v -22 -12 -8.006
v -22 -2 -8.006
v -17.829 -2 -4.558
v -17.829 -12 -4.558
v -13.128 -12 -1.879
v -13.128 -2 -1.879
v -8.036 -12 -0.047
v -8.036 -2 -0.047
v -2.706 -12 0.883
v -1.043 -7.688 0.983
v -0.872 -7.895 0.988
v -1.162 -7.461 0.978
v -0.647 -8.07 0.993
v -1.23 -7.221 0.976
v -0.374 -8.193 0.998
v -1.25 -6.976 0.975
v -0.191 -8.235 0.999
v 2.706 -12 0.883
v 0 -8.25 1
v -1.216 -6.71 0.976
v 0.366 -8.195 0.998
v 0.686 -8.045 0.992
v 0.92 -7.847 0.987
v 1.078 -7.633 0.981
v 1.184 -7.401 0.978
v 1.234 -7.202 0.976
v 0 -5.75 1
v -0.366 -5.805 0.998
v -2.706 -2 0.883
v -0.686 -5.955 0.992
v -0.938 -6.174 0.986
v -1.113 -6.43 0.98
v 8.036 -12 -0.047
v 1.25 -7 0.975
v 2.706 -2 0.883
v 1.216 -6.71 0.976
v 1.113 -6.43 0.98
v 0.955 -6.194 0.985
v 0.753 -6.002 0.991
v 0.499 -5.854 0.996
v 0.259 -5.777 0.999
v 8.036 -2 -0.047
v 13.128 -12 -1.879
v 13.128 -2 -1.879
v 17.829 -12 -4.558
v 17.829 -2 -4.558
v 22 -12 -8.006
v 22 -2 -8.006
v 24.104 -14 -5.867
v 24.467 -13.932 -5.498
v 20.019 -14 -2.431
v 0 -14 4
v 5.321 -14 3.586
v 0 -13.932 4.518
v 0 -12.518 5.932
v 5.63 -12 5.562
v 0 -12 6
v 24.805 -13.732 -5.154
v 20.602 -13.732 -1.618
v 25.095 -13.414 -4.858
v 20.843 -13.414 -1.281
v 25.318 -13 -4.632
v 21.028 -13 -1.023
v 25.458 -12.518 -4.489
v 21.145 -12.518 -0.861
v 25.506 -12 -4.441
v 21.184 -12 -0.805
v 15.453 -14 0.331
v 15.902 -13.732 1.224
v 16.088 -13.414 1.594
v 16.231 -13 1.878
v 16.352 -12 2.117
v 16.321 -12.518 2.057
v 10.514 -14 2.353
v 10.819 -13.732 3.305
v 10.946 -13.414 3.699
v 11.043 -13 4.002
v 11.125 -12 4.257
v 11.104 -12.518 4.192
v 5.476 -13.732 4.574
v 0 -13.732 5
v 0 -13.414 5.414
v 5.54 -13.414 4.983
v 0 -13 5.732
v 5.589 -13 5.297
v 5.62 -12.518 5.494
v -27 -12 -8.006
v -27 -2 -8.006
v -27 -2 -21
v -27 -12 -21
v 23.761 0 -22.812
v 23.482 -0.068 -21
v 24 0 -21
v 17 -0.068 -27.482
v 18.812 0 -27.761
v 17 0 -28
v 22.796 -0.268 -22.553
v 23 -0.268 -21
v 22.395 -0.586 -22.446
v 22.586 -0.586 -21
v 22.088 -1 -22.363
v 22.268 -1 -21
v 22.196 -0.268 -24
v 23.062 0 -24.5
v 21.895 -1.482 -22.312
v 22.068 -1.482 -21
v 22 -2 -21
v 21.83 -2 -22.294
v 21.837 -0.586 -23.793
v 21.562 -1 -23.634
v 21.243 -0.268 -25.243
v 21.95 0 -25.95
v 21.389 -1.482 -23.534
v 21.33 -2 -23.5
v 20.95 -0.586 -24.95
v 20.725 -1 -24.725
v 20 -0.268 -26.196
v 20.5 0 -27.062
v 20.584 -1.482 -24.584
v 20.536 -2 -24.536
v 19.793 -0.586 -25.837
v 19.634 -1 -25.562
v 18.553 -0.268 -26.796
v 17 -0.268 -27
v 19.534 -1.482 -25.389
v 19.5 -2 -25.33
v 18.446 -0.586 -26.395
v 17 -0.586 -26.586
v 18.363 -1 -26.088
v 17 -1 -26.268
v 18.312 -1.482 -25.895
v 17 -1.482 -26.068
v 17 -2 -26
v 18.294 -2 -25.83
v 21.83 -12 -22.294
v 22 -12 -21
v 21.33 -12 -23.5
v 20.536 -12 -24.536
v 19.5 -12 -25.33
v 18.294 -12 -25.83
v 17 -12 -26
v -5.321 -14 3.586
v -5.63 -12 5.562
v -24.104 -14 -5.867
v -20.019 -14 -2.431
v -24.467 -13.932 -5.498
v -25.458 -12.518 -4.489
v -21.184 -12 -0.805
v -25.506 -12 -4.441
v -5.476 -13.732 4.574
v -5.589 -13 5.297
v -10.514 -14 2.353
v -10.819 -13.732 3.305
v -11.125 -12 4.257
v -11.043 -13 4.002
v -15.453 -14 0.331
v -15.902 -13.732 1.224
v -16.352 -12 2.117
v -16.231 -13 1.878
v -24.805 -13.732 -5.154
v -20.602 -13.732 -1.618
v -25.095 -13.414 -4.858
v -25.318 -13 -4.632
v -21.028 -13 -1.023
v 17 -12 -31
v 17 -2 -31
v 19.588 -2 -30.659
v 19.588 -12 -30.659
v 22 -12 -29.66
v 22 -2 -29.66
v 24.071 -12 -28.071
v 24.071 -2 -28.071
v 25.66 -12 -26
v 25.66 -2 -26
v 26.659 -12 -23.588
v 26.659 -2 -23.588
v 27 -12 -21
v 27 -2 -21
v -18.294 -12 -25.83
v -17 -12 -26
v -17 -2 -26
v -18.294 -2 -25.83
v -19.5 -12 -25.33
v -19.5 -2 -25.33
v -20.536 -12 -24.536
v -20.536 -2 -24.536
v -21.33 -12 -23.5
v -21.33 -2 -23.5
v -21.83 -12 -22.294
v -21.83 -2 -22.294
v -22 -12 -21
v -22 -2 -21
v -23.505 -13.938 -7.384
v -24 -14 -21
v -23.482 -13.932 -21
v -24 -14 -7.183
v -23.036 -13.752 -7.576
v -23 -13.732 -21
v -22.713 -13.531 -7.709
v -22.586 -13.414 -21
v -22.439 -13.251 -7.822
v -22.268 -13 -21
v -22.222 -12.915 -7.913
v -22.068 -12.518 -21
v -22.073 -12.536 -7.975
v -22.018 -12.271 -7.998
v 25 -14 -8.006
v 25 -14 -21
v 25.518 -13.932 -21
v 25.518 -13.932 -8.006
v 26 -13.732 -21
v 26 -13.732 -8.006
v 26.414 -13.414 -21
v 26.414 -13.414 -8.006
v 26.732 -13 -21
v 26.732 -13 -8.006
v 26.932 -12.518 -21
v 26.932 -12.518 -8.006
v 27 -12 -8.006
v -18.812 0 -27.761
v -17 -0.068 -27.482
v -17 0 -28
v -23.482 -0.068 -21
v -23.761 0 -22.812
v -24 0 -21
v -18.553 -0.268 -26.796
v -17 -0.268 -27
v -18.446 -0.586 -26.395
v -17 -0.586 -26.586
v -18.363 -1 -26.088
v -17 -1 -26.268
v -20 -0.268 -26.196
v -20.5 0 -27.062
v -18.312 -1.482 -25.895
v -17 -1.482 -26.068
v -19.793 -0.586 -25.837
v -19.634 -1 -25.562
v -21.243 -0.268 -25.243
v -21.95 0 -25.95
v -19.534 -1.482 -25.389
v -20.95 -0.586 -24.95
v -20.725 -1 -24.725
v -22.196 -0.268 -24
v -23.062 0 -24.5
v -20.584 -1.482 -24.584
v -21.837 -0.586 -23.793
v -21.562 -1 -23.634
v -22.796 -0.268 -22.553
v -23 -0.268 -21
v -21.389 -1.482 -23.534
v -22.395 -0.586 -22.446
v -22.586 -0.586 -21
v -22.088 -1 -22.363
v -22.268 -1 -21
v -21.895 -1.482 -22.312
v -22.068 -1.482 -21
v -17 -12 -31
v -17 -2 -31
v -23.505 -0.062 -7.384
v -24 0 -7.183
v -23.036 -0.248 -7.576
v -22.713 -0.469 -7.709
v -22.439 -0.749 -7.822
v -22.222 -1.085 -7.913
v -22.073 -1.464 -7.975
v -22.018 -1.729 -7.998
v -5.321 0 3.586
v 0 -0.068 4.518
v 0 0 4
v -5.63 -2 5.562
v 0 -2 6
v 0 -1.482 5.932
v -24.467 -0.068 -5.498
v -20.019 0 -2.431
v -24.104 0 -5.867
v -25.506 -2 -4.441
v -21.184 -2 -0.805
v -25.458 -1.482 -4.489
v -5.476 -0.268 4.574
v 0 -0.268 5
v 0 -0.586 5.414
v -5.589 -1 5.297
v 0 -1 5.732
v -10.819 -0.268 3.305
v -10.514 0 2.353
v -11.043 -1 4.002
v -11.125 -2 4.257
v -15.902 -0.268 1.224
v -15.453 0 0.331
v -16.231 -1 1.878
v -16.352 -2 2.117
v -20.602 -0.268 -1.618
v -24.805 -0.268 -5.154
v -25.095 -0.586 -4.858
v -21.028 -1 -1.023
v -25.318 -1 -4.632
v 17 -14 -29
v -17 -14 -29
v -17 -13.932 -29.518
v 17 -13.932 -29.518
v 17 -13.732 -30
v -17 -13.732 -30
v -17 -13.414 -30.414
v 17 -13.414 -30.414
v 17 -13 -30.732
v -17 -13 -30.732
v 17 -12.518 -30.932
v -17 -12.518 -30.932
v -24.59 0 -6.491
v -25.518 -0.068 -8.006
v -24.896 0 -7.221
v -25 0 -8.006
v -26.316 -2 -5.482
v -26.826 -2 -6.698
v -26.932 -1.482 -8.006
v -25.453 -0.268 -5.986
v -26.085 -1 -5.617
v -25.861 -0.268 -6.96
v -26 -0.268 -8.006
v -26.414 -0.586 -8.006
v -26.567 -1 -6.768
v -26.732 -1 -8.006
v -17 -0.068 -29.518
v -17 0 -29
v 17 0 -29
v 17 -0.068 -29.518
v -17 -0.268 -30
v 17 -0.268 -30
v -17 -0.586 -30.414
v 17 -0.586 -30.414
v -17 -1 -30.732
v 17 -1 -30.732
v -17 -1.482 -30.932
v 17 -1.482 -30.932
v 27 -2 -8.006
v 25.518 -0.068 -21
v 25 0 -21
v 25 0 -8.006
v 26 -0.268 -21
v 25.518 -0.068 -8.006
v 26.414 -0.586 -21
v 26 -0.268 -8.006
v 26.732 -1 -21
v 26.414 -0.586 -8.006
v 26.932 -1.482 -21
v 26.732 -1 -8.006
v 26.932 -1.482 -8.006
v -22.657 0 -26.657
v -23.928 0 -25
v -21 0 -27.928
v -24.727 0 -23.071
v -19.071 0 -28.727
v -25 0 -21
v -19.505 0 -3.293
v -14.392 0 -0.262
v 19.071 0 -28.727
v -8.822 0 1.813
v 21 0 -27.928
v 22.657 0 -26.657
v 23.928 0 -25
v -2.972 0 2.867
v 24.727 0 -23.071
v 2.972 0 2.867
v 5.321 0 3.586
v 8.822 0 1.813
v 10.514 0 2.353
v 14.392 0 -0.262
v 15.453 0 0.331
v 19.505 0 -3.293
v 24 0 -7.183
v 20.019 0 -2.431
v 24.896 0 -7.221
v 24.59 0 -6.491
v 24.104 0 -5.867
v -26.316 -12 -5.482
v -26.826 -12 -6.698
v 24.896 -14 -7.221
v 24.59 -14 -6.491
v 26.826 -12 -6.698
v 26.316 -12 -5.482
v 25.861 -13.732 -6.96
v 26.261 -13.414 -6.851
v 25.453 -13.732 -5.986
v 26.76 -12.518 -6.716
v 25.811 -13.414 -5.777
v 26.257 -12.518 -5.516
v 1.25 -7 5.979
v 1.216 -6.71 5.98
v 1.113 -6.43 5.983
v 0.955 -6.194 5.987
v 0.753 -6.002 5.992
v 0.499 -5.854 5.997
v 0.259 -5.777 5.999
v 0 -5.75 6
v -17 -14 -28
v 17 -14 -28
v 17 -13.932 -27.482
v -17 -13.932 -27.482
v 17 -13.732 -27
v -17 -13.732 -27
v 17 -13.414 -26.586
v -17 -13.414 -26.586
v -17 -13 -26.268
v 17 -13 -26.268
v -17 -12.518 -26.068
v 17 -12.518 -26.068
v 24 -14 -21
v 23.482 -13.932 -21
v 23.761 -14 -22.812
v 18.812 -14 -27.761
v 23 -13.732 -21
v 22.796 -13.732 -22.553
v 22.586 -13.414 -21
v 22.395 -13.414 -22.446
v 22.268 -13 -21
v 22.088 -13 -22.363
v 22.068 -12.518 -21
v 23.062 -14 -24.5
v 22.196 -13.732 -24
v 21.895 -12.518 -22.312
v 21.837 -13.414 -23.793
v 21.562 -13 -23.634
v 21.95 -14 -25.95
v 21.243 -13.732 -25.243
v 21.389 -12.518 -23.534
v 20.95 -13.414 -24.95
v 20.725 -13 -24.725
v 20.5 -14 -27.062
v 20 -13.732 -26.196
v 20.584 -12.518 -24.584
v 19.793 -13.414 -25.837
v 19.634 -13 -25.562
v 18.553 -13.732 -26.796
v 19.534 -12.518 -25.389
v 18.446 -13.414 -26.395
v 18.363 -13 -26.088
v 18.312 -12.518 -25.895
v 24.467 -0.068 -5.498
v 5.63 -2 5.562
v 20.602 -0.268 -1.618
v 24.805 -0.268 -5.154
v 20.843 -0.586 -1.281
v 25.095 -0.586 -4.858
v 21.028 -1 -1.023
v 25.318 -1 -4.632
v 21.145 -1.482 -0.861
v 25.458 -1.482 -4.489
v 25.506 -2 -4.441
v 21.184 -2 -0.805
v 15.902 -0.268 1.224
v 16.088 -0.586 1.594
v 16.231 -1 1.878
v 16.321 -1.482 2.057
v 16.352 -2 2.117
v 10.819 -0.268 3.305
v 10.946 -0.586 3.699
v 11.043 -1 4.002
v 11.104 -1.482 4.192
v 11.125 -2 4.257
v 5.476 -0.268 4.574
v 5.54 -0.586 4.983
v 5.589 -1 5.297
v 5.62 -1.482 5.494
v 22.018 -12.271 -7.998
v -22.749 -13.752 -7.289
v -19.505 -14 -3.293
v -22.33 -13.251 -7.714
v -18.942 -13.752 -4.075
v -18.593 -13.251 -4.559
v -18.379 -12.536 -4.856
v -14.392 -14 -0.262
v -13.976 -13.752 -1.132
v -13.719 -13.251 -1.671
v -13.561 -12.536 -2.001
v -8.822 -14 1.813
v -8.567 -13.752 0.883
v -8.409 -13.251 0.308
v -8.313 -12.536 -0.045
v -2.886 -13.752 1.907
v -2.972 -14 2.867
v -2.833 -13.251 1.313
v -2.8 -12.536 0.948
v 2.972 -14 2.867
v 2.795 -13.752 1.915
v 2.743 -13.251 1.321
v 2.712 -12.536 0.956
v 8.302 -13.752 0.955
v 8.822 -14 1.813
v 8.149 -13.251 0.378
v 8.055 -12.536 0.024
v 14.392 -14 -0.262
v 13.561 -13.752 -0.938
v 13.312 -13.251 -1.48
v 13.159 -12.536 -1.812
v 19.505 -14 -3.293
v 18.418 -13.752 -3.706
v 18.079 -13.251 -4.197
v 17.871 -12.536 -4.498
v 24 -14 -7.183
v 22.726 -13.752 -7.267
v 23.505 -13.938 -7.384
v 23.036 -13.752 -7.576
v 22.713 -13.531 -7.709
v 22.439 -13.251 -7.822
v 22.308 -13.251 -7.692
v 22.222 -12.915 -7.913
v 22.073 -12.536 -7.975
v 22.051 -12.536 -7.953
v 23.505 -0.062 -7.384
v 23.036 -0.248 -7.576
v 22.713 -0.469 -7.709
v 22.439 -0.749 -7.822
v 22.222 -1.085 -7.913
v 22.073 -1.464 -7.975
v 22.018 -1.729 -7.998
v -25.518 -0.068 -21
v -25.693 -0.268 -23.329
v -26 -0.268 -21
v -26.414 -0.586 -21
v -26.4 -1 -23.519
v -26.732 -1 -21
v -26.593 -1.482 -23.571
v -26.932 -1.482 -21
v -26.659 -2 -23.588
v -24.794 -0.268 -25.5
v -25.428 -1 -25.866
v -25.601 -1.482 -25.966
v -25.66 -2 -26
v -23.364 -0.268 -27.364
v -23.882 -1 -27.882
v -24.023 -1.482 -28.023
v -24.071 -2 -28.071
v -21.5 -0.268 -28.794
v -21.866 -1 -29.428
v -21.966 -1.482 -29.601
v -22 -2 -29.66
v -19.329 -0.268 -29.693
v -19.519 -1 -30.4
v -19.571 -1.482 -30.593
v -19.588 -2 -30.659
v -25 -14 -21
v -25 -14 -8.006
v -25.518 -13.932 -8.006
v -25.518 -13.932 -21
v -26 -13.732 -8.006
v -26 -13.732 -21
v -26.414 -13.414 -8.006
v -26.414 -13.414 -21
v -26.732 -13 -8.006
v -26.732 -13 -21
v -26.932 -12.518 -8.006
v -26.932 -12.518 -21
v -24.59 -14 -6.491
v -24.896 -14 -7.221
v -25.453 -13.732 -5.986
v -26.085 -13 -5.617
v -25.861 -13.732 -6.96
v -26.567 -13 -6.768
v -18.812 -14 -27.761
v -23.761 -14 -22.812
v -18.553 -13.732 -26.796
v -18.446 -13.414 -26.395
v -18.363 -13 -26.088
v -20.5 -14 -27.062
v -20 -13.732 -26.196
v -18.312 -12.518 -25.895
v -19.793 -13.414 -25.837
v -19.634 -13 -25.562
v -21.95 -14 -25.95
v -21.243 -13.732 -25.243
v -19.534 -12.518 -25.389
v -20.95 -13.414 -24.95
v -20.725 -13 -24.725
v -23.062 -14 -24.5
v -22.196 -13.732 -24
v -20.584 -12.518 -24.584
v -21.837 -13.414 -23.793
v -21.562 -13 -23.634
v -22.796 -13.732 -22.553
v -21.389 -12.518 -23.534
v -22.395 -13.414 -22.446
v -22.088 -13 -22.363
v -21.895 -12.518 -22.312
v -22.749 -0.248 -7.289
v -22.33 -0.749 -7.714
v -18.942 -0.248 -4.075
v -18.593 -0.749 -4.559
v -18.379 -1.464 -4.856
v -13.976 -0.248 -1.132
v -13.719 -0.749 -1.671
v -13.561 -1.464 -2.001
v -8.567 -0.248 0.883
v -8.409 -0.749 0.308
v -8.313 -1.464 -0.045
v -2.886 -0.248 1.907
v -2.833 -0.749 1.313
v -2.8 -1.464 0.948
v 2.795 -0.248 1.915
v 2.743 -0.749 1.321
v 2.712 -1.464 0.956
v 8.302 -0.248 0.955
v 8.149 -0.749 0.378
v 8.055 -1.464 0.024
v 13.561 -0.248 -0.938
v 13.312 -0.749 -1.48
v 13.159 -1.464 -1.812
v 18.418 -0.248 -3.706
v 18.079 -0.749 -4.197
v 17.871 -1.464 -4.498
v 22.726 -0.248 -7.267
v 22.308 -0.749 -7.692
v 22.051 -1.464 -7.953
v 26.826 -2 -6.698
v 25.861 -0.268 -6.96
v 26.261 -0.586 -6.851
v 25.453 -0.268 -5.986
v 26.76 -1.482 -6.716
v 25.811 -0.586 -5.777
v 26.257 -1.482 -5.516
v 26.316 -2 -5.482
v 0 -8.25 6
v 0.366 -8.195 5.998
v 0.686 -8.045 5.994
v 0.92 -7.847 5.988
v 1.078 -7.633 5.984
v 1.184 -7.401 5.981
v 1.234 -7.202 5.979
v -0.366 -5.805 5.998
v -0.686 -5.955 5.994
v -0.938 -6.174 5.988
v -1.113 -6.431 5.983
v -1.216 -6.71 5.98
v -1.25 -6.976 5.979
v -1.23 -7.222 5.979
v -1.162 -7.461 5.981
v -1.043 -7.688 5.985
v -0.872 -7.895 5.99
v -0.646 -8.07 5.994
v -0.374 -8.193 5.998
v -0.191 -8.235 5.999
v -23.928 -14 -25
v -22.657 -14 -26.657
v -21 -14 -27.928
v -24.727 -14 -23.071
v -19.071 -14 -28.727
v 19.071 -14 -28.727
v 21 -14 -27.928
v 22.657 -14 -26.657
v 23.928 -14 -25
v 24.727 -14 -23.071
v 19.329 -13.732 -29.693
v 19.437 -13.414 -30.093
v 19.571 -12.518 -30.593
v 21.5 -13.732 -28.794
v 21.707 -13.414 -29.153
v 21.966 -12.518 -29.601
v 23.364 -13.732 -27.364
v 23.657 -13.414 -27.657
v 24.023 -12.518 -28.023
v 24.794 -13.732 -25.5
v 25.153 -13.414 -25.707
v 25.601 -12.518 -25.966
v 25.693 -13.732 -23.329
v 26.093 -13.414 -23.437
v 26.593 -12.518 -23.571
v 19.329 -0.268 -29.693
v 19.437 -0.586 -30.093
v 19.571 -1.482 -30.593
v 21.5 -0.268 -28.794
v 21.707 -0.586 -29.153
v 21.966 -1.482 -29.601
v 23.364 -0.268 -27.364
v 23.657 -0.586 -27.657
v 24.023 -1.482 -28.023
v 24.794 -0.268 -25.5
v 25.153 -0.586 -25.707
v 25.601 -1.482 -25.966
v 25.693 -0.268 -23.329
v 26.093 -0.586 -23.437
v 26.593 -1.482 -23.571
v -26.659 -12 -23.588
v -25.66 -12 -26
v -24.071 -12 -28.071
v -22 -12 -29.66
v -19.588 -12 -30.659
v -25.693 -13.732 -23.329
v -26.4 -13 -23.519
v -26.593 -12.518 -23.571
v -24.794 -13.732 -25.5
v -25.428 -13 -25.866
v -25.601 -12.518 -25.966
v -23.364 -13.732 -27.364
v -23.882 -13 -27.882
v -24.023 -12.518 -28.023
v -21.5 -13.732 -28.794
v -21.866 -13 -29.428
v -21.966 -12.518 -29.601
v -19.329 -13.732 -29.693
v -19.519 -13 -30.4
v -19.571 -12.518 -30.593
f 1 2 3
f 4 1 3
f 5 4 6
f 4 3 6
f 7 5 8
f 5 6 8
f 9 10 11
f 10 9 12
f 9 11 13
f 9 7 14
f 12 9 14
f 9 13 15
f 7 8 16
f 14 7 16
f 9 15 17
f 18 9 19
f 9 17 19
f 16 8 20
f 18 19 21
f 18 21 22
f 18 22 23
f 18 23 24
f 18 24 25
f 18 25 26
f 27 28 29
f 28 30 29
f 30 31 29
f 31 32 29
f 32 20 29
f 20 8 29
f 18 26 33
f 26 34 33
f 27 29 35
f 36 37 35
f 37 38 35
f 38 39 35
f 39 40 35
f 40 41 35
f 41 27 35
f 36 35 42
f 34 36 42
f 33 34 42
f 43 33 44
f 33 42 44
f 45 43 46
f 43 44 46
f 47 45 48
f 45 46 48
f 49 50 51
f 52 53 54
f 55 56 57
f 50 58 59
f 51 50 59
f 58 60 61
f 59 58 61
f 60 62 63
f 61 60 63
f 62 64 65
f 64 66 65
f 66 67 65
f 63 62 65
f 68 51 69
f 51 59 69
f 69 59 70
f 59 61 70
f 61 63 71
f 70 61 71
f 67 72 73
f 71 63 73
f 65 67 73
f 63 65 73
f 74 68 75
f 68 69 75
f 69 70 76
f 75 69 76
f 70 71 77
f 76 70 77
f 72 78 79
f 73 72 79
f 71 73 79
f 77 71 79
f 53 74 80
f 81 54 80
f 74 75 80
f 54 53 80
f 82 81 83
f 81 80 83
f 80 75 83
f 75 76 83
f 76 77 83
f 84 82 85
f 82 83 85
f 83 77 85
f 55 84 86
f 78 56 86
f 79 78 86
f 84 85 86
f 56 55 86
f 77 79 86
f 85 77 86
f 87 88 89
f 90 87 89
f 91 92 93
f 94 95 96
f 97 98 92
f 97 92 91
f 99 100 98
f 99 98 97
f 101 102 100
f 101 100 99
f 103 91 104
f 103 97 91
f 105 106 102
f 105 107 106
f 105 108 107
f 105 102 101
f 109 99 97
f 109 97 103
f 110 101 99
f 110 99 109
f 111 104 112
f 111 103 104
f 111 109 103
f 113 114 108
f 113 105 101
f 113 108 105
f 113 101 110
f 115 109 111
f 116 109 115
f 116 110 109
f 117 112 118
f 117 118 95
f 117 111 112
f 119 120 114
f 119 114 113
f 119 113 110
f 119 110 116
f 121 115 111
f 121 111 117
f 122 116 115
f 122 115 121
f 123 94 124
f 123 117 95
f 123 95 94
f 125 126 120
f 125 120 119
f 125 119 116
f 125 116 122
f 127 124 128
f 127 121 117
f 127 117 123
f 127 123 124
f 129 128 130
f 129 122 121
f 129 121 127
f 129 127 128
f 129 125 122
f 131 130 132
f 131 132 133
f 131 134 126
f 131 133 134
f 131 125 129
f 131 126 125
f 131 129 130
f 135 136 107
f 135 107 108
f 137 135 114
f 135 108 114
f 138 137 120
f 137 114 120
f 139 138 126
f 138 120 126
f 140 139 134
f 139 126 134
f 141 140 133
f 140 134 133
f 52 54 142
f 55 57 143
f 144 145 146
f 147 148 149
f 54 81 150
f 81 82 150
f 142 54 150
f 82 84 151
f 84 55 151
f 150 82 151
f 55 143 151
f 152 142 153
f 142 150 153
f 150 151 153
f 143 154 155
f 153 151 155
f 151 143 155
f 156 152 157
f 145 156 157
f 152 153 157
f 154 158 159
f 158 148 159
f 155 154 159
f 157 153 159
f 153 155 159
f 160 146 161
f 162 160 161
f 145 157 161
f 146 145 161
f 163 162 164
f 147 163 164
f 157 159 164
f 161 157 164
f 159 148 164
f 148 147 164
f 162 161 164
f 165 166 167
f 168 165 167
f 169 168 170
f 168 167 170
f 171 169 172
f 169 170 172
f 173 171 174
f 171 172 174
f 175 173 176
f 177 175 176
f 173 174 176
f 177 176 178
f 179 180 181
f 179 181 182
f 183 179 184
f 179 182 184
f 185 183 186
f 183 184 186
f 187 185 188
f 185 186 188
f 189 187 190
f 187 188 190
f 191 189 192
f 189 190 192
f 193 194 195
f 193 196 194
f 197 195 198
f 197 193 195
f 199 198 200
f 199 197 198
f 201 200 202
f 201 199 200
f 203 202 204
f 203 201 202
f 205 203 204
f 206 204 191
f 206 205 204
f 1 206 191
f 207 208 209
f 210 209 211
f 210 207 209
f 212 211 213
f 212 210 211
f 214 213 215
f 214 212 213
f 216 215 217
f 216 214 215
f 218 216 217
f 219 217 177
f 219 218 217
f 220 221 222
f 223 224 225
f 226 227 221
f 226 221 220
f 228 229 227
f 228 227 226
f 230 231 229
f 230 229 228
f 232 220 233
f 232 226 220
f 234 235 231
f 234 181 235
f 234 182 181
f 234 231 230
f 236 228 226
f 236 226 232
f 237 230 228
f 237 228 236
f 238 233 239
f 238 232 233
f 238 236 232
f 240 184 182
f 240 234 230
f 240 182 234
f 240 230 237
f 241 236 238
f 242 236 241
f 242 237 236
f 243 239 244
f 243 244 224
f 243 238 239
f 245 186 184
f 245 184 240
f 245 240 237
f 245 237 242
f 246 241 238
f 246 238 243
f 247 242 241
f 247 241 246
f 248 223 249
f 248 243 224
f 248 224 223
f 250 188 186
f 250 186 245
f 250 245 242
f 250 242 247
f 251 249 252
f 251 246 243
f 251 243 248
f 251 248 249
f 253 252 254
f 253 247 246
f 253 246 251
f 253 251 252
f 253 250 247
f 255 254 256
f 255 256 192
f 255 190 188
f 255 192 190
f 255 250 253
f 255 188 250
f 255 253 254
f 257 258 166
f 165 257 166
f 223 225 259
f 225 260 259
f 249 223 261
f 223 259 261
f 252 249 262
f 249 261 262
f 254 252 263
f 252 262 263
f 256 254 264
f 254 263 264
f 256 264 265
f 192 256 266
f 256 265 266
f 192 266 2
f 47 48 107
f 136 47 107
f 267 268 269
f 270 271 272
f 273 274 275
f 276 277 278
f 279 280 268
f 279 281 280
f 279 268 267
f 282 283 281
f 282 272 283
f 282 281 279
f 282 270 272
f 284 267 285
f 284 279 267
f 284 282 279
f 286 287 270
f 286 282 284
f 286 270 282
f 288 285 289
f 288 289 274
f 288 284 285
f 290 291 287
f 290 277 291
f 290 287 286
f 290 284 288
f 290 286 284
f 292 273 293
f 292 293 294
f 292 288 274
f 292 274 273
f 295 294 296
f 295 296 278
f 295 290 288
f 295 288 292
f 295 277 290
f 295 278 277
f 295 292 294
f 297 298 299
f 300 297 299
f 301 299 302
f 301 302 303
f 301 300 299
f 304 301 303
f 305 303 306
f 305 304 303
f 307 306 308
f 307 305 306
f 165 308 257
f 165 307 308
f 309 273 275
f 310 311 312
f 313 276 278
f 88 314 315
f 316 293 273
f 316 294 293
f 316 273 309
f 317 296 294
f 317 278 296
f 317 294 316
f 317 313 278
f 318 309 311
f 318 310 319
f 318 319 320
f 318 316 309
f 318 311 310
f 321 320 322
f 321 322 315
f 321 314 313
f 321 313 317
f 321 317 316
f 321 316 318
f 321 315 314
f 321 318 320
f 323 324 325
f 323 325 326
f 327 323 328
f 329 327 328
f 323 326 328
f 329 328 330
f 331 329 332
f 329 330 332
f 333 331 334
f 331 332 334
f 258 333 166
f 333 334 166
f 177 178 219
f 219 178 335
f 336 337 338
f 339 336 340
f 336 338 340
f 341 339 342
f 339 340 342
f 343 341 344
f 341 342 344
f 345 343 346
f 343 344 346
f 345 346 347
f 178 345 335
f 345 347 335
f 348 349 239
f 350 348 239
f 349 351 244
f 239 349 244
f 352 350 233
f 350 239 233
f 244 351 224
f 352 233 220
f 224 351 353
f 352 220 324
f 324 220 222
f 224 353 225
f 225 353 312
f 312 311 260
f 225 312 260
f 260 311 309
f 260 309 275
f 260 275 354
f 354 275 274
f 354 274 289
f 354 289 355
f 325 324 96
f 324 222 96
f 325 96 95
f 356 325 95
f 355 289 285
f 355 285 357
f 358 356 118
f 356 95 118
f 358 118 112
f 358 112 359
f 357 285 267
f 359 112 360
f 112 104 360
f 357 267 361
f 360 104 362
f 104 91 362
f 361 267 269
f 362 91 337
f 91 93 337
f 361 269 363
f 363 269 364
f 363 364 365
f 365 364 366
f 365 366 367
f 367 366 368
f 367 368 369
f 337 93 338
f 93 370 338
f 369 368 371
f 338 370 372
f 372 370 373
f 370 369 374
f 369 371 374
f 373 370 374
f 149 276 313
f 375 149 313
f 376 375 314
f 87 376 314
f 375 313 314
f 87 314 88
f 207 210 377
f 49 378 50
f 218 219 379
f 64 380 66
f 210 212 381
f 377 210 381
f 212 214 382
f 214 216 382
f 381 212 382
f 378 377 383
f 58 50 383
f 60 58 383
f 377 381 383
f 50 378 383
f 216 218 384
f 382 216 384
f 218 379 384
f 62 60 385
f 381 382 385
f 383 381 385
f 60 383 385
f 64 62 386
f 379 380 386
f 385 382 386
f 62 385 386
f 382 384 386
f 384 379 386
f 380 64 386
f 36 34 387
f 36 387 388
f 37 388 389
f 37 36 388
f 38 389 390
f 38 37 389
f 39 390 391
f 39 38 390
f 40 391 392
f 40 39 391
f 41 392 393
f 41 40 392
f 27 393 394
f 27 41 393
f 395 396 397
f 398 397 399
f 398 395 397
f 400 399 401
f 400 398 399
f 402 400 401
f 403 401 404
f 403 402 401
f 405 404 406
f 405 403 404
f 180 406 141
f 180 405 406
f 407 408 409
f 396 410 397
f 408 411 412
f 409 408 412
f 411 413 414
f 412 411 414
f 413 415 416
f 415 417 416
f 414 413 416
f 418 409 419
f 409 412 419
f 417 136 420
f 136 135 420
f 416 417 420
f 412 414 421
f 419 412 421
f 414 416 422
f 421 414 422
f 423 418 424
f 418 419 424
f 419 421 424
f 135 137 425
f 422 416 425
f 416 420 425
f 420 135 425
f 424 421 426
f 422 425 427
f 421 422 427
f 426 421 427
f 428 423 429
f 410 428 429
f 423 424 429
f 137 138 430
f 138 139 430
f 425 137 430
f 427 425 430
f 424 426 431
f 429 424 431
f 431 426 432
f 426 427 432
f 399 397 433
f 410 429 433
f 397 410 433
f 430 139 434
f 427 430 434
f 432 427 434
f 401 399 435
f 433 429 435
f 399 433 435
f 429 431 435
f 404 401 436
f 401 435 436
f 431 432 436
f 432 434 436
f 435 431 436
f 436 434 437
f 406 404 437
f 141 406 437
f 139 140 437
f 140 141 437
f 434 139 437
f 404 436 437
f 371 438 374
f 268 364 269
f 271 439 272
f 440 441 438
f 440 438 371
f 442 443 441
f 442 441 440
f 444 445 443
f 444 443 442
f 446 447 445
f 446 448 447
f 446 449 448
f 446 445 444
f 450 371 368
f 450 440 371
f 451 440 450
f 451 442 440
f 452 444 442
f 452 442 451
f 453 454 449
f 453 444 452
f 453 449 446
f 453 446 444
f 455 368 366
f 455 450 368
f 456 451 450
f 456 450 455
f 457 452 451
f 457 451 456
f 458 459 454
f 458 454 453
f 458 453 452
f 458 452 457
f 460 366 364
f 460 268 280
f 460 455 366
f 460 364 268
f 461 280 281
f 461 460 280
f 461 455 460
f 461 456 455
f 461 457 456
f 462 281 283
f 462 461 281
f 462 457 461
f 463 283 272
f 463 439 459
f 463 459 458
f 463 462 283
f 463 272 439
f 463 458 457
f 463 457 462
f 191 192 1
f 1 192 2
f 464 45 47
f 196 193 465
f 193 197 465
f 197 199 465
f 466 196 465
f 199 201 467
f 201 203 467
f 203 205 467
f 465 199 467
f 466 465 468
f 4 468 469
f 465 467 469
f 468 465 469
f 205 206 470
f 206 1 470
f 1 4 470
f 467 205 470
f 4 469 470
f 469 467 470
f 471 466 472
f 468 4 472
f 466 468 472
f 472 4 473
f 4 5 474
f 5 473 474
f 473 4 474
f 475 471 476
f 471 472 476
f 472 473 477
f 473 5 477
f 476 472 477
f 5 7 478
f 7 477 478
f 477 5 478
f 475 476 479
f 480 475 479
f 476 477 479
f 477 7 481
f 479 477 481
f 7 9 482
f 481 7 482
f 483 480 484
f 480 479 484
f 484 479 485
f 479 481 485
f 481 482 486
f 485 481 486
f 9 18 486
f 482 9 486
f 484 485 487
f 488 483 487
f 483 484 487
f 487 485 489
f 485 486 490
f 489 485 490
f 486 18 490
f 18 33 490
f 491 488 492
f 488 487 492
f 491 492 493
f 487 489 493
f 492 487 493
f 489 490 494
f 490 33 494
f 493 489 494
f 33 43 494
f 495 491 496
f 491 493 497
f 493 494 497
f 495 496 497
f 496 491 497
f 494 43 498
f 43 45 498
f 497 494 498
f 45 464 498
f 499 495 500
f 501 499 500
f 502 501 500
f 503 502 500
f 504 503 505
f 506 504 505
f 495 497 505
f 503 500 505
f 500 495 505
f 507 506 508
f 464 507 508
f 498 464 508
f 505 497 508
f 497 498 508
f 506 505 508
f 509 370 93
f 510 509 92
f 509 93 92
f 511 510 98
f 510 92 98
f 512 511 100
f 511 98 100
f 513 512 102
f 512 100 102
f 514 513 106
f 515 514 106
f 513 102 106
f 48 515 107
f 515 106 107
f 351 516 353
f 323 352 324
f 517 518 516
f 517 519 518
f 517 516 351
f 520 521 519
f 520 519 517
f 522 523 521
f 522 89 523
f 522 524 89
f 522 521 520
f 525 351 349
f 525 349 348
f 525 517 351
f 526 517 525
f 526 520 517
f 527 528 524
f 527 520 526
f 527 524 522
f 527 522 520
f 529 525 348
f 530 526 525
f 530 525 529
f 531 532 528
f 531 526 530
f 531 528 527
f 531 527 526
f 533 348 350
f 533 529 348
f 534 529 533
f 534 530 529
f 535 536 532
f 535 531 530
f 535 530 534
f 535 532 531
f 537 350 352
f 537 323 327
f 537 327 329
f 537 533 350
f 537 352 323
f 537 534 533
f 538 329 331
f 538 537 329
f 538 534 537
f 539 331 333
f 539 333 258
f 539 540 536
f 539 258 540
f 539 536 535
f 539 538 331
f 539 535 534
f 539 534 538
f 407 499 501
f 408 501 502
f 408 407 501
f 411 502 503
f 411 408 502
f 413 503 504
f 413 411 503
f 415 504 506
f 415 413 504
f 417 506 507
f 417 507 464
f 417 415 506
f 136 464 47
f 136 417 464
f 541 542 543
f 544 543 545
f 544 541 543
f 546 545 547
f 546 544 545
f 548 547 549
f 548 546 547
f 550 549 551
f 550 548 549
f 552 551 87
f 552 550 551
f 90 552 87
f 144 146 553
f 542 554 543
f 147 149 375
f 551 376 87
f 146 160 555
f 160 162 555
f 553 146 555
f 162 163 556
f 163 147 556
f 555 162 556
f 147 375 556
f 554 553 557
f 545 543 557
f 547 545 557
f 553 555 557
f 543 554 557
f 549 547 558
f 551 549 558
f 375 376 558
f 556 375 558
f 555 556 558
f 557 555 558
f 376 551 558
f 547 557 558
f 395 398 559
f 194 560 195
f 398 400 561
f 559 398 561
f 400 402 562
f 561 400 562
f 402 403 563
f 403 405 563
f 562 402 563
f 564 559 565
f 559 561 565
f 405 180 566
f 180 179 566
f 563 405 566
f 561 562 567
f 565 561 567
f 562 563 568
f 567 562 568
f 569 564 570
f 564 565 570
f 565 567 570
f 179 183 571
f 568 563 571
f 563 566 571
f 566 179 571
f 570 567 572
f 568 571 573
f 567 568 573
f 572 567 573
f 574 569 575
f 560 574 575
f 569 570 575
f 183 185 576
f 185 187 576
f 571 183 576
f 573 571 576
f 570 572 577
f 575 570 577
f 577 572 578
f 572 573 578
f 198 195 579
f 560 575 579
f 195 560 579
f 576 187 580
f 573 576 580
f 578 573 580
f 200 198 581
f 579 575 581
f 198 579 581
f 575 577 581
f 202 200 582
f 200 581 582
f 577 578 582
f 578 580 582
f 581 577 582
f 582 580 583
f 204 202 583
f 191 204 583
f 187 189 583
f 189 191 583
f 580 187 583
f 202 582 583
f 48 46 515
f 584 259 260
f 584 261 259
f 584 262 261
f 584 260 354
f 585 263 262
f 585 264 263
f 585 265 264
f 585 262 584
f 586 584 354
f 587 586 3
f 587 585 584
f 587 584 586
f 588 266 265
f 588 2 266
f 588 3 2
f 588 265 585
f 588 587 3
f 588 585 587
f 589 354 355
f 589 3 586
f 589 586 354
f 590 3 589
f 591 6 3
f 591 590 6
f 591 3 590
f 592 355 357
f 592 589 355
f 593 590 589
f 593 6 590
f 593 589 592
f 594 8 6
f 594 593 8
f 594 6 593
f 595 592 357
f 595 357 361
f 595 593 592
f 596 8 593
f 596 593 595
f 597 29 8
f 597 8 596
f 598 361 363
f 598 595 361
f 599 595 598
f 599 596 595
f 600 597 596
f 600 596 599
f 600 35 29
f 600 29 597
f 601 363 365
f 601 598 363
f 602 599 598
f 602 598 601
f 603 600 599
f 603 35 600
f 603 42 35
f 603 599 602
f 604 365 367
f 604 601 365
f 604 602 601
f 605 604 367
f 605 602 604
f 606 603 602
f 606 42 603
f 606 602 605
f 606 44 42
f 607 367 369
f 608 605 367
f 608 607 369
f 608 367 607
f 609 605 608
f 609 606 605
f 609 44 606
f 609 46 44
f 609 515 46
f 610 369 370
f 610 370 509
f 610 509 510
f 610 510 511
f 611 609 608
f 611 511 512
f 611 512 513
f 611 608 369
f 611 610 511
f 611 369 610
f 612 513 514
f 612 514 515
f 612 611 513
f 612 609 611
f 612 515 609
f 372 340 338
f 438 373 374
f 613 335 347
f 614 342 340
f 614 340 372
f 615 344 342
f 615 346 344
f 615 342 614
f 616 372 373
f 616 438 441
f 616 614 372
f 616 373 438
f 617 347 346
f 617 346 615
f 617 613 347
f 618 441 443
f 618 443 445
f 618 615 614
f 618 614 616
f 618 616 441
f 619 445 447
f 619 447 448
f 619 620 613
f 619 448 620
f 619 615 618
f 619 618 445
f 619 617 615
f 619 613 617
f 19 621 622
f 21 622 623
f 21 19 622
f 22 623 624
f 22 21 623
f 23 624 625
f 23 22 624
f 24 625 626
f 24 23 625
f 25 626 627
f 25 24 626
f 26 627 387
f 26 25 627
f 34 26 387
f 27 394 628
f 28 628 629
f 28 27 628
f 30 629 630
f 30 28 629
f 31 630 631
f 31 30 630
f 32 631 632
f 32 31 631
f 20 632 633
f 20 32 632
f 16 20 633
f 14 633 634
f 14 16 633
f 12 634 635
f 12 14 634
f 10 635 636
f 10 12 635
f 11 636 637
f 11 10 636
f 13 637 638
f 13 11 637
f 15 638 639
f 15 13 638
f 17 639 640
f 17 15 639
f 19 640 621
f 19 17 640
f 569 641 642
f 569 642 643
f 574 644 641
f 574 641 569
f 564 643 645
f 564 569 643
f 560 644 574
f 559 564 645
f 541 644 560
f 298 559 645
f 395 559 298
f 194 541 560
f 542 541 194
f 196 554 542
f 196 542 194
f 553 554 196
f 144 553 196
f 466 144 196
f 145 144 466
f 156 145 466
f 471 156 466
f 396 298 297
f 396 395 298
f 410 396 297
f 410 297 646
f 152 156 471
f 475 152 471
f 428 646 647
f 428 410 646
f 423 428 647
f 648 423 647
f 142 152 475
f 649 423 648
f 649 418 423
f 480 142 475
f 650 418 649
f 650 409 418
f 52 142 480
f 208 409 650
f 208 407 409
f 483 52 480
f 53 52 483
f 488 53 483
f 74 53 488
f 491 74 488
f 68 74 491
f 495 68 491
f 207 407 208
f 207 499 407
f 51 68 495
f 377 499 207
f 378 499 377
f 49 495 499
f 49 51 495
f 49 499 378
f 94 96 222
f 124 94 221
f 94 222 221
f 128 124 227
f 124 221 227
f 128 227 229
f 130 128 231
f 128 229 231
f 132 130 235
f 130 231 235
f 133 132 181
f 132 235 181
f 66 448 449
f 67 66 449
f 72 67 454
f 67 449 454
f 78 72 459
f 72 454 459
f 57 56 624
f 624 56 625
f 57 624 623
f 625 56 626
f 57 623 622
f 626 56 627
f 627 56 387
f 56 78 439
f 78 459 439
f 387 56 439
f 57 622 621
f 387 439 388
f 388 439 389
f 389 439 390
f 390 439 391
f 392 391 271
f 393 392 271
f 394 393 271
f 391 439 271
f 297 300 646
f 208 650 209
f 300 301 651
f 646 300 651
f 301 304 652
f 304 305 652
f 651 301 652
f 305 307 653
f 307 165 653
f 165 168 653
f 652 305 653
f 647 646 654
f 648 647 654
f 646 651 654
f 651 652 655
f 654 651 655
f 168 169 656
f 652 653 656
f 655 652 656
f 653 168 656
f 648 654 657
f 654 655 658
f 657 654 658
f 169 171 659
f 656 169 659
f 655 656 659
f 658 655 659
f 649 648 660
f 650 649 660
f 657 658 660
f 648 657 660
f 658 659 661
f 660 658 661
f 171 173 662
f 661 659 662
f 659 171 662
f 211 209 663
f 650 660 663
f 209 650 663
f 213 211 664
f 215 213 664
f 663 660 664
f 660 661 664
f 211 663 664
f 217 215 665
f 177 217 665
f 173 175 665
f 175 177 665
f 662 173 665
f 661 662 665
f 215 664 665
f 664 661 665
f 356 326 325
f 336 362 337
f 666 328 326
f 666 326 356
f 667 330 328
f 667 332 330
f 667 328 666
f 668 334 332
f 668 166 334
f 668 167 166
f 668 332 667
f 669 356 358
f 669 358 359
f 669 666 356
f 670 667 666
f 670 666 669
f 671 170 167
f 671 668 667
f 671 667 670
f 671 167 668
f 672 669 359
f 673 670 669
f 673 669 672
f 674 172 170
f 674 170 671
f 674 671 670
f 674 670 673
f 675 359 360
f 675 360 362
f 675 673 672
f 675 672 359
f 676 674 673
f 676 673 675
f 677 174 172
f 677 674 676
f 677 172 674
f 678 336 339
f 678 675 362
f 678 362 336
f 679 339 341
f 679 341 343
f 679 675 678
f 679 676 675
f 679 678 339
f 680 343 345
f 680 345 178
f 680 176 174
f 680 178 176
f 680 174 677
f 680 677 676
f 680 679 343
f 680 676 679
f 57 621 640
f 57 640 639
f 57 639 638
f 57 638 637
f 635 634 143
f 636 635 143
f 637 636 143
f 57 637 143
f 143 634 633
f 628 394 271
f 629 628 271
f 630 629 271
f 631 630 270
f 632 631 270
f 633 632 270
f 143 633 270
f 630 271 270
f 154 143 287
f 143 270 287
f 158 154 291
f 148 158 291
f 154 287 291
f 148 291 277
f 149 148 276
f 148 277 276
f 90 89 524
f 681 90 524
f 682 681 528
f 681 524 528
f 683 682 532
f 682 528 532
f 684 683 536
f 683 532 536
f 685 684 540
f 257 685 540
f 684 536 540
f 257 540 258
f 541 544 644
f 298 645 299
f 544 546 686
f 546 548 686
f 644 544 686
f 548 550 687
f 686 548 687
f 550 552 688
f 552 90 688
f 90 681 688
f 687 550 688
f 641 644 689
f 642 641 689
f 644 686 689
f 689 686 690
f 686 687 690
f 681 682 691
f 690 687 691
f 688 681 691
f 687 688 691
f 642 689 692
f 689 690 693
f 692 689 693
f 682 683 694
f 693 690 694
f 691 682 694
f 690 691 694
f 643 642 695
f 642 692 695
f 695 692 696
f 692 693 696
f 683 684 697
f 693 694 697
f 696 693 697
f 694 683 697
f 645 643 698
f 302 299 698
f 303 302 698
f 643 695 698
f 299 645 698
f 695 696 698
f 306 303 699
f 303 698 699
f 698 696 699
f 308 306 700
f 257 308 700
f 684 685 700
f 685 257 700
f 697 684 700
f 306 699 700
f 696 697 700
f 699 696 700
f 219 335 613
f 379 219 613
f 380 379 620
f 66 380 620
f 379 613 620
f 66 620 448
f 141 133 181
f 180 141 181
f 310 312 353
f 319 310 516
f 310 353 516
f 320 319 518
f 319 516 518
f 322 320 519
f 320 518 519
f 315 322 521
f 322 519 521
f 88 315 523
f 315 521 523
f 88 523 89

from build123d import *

# Parameters (mm, degrees)
F1_DEPTH = 14
F3_DEPTH = 23.7
F4_R     = 2


with BuildPart() as f1:
    # F0 (on Front) → F1 (new body)
    with BuildSketch(Plane.XZ):
        with BuildLine():
            ThreePointArc((27, -8.005587), (26.611392, -6.072957), (25.505976, -4.440741))
            ThreePointArc((25.505976, -4.440741), (13.780093, 3.288774), (0, 6))
            ThreePointArc((0, 6), (-13.780093, 3.288774), (-25.505976, -4.440741))
            ThreePointArc((-25.505976, -4.440741), (-26.611392, -6.072957), (-27, -8.005587))
            Line((-27, -8.005587), (-27, -21))
            ThreePointArc((-27, -21), (-24.071068, -28.071068), (-17, -31))
            Line((-17, -31), (17, -31))
            ThreePointArc((17, -31), (24.071068, -28.071068), (27, -21))
            Line((27, -21), (27, -8.005587))
        make_face()
        with BuildLine():
            ThreePointArc((-22, -8.005587), (0, 1), (22, -8.005587))
            Line((22, -8.005587), (22, -21))
            ThreePointArc((22, -21), (20.535534, -24.535534), (17, -26))
            Line((17, -26), (-17, -26))
            ThreePointArc((-17, -26), (-20.535534, -24.535534), (-22, -21))
            Line((-22, -21), (-22, -8.005587))
        make_face(mode=Mode.SUBTRACT)
    extrude(amount=F1_DEPTH)

    # F2 (on Top) → F3 (cut)
    with BuildSketch(Plane.XY):
        with BuildLine():
            ThreePointArc((0, -8.25), (0.883883, -7.883883), (1.25, -7))
            ThreePointArc((1.25, -7), (0.883883, -6.116117), (0, -5.75))
            Line((0, -5.75), (0, -8.25))
        make_face()
        with BuildLine():
            Line((0, -8.25), (0, -5.75))
            ThreePointArc((0, -5.75), (-1.25, -7), (0, -8.25))
        make_face()
    extrude(amount=F3_DEPTH, mode=Mode.SUBTRACT)

    # F4
    f4_edges = [f1.edges().sort_by_distance(p)[0] for p in [
        (0, -14, 1),
        (22, -14, -14.502794),
        (20.535534, -14, -24.535534),
        (0, 0, -26),
        (0, 0, 1),
        (0, 0, -31),
        (0, -14, -31),
    ]]
    fillet(f4_edges, radius=F4_R)


solid = f1.part
